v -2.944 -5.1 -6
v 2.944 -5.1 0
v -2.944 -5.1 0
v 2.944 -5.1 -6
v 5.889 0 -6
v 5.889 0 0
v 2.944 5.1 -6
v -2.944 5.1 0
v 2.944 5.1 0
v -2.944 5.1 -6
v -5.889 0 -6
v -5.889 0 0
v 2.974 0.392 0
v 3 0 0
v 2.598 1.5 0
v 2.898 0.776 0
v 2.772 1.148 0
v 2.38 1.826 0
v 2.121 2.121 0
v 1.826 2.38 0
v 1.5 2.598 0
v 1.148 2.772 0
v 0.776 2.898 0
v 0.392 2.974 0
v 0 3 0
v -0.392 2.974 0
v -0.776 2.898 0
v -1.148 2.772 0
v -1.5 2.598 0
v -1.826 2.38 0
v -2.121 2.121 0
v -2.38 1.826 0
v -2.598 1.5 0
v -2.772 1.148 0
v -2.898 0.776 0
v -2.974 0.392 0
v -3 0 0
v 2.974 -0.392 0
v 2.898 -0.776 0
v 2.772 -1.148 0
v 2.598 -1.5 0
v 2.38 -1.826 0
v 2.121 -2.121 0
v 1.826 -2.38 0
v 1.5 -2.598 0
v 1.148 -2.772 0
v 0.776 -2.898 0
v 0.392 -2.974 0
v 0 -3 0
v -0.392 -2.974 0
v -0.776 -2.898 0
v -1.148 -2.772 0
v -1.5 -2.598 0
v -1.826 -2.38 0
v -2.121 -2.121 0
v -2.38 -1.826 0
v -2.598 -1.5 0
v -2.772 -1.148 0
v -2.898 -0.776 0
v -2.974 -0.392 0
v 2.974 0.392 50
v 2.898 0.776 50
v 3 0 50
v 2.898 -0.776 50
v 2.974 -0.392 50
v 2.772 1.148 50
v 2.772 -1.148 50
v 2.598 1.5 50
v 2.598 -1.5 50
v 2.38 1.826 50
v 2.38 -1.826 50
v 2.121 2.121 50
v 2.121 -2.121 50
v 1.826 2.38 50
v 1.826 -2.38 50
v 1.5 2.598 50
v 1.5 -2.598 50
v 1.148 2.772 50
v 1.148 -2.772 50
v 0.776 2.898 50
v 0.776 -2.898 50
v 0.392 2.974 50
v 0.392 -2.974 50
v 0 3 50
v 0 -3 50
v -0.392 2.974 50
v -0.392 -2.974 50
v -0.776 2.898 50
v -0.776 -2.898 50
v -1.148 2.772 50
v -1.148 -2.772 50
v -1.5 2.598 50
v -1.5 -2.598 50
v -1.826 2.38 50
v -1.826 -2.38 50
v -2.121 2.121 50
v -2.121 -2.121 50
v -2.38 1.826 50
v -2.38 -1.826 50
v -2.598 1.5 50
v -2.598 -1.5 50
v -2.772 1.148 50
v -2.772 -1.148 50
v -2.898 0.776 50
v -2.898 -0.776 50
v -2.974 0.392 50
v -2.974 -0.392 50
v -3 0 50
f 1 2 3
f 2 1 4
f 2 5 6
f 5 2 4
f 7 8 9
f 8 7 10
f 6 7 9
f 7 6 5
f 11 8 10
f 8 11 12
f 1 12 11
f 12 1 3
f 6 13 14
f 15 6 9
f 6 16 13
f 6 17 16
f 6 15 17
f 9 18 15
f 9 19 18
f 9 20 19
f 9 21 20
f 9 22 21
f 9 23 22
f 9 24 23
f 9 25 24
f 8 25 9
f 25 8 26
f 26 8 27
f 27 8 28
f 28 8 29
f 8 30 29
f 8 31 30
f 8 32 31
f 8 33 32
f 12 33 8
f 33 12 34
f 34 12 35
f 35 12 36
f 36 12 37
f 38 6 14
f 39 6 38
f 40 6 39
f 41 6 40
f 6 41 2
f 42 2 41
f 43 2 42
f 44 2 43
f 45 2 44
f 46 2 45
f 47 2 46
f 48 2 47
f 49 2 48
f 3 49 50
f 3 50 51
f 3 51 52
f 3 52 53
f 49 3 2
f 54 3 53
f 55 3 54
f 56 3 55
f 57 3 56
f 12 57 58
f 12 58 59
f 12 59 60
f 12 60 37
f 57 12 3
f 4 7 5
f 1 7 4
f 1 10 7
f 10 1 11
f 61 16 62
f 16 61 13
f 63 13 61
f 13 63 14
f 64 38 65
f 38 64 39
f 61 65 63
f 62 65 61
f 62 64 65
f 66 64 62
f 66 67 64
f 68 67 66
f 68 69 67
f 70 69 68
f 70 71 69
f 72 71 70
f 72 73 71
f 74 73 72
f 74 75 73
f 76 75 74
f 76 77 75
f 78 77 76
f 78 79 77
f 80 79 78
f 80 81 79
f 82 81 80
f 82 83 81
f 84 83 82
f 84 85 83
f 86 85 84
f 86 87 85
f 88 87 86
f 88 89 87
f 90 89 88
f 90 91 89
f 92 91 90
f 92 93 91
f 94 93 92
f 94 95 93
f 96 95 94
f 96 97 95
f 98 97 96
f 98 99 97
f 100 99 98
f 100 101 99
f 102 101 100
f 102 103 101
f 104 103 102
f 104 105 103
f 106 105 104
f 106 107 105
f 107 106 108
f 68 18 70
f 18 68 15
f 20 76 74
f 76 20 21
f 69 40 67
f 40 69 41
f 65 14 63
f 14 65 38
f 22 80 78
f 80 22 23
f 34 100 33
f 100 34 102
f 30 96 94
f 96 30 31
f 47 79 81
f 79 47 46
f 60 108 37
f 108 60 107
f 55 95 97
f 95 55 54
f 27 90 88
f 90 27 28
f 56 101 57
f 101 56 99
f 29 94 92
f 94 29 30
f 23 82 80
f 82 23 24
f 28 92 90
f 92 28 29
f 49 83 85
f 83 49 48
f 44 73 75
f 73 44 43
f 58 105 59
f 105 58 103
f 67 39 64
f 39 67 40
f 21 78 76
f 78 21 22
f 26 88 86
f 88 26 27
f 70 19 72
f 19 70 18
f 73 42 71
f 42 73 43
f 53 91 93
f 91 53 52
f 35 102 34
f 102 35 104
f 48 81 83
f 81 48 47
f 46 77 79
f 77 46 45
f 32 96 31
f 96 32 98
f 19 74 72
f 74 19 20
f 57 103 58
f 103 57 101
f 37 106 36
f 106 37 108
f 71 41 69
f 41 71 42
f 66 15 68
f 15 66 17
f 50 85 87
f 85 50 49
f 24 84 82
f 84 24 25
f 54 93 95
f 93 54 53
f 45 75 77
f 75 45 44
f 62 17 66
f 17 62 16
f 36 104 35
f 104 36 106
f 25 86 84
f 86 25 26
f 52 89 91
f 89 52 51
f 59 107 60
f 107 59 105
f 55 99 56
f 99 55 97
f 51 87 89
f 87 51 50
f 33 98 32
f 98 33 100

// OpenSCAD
// screw_long : hex-head screw (approximation, threads NOT modelled)
// Onshape: hex head 6 mm high (z = -6 .. 0), ~10.2 mm across flats (circumradius 5.89),
// shank D6 extruded 50 mm, overall part studio height z = -6 .. 66.
// Threads were made with the "Thread Creator" FS (pitch parameter 2 mm). For real threads use
// e.g. BOSL2:  include <BOSL2/std.scad> include <BOSL2/threading.scad>
//              threaded_rod(d=6, l=50, pitch=2, anchor=BOTTOM);
// NOTE: the part studio also contains helper bodies "subtractr", "Part 3" and "holesubtractor"
// that are used as boolean cutting tools for the bracket (see README). They are in the STEP/STL.
af = 10.2; head_h = 6; d = 6; len = 50;
translate([0, 0, -head_h]) cylinder(d = af / cos(30), h = head_h, $fn = 6);
cylinder(d = d, h = len, $fn = 48);
